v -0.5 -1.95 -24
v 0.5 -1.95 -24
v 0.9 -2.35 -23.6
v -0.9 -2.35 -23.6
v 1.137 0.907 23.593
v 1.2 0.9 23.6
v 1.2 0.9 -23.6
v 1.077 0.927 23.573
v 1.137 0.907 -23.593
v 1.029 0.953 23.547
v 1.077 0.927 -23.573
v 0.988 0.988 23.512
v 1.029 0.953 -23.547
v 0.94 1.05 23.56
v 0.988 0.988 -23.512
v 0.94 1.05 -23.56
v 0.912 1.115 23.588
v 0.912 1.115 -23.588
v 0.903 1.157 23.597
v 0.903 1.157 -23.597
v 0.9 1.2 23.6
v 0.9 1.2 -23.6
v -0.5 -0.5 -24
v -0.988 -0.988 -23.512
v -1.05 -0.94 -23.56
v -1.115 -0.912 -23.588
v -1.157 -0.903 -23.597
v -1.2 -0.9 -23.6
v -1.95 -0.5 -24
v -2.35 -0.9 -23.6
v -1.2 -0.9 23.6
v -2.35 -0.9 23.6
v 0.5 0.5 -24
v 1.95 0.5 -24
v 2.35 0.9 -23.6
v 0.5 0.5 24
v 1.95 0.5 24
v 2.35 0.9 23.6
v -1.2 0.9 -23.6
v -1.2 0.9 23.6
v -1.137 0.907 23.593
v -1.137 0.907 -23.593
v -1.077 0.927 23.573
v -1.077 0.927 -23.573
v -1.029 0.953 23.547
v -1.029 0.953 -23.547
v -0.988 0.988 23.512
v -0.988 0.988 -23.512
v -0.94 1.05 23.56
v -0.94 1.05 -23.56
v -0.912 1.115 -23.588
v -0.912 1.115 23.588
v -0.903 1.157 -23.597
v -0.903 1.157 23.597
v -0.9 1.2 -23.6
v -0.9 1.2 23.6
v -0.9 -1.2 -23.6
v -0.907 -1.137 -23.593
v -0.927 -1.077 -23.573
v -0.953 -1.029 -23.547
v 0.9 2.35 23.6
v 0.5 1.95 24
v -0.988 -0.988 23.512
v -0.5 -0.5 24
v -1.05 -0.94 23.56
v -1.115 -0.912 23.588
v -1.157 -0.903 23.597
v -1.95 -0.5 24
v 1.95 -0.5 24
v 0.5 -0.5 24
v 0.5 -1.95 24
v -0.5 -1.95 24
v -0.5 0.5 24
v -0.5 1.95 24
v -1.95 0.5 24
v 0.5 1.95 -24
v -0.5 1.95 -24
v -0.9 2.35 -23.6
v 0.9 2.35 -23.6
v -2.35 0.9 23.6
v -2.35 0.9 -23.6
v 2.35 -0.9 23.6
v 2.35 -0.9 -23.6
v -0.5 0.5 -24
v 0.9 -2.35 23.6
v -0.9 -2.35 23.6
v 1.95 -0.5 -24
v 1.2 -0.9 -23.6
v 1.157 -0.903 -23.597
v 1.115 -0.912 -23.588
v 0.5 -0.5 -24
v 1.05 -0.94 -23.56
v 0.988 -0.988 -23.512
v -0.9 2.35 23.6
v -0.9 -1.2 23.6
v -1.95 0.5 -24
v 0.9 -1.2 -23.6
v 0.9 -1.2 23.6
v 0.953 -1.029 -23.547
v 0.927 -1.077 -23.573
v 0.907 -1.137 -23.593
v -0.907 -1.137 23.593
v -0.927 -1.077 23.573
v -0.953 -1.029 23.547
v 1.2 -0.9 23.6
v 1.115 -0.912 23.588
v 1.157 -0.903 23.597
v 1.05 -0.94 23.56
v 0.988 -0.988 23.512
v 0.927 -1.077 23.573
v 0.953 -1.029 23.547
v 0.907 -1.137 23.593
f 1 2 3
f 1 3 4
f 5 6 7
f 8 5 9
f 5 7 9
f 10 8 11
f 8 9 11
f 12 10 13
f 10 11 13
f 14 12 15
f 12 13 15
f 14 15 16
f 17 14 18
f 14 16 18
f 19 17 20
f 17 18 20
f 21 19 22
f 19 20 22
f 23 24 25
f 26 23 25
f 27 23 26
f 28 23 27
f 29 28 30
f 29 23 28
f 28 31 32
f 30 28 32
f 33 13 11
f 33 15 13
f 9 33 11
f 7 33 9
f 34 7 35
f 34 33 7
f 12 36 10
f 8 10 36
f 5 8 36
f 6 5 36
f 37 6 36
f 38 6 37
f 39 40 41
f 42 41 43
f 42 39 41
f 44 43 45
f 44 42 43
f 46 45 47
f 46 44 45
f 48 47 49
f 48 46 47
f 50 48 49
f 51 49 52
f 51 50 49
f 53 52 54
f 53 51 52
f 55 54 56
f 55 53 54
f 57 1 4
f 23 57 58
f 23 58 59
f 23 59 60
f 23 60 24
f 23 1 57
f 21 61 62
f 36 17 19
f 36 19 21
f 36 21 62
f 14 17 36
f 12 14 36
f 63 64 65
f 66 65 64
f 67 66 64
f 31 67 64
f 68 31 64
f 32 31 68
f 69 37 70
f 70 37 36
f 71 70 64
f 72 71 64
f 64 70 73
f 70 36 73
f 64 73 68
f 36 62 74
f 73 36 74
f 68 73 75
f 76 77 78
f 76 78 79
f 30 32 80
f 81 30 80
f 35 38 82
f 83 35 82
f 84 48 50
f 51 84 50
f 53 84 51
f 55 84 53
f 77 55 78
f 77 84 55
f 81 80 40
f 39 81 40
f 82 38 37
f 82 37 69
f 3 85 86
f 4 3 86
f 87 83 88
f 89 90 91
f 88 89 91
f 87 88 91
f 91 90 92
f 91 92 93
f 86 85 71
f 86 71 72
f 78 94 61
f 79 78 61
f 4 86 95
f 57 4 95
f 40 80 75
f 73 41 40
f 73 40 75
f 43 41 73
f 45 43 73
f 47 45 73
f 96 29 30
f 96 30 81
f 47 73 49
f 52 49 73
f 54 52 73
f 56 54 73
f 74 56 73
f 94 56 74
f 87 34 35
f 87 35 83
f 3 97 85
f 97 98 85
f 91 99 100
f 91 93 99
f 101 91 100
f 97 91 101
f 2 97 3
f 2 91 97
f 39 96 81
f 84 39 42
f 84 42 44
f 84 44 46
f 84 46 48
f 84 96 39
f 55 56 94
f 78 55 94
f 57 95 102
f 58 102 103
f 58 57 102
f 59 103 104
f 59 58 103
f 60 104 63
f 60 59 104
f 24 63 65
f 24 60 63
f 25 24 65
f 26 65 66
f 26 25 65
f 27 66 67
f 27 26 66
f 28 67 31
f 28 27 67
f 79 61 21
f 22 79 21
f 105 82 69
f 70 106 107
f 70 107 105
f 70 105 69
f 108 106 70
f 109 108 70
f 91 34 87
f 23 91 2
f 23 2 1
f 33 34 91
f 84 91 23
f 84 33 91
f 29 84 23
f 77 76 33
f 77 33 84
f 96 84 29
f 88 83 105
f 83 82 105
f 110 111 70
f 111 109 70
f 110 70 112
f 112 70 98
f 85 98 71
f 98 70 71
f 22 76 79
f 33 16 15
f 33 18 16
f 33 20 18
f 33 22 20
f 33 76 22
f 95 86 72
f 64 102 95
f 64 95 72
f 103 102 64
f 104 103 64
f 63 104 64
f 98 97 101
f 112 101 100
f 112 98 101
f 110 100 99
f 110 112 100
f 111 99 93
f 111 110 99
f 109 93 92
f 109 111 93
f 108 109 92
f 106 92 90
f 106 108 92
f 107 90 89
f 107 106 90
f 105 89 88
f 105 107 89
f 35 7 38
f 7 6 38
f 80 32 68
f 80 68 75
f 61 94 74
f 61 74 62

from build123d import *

# Parameters (mm, degrees)
BOSS_EXTRUDE1_DEPTH = 24
CHAMFER1_SIZE       = 0.4
FILLET1_R           = 0.3


with BuildPart() as part:
    # Sketch1 → Boss-Extrude1 (new, symmetric)
    with BuildSketch(Plane.XY):
        Polygon((0.9, -0.9), (0.9, -2.35), (-0.9, -2.35), (-0.9, -0.9), (-2.35, -0.9), (-2.35, 0.9), (-0.9, 0.9), (-0.9, 2.35), (0.9, 2.35), (0.9, 0.9), (2.35, 0.9), (2.35, -0.9), align=None)
    extrude(amount=BOSS_EXTRUDE1_DEPTH, both=True)

    # Chamfer1
    chamfer1_edges = [part.edges().sort_by_distance(p)[0] for p in [
        (0.9, -1.625, -24),
        (0, -2.35, -24),
        (1.625, 0.9, 24),
        (-0.9, -1.625, -24),
        (-1.625, -0.9, -24),
        (-2.35, 0, -24),
        (-1.625, 0.9, -24),
        (-0.9, 1.625, -24),
        (0, 2.35, -24),
        (0.9, 1.625, -24),
        (1.625, 0.9, -24),
        (2.35, 0, -24),
        (1.625, -0.9, -24),
        (0.9, 1.625, 24),
        (0, 2.35, 24),
        (-0.9, 1.625, 24),
        (-1.625, 0.9, 24),
        (-2.35, 0, 24),
        (-1.625, -0.9, 24),
        (-0.9, -1.625, 24),
        (0, -2.35, 24),
        (0.9, -1.625, 24),
        (1.625, -0.9, 24),
        (2.35, 0, 24),
    ]]
    chamfer(chamfer1_edges, length=CHAMFER1_SIZE)

    # Fillet1
    fillet1_edges = [part.edges().sort_by_distance(p)[0] for p in [
        (0.9, 0.9, 0),
        (-0.9, 0.9, 0),
        (-0.9, -0.9, 0),
        (0.9, -0.9, 0),
    ]]
    fillet(fillet1_edges, radius=FILLET1_R)


solid = part.part
